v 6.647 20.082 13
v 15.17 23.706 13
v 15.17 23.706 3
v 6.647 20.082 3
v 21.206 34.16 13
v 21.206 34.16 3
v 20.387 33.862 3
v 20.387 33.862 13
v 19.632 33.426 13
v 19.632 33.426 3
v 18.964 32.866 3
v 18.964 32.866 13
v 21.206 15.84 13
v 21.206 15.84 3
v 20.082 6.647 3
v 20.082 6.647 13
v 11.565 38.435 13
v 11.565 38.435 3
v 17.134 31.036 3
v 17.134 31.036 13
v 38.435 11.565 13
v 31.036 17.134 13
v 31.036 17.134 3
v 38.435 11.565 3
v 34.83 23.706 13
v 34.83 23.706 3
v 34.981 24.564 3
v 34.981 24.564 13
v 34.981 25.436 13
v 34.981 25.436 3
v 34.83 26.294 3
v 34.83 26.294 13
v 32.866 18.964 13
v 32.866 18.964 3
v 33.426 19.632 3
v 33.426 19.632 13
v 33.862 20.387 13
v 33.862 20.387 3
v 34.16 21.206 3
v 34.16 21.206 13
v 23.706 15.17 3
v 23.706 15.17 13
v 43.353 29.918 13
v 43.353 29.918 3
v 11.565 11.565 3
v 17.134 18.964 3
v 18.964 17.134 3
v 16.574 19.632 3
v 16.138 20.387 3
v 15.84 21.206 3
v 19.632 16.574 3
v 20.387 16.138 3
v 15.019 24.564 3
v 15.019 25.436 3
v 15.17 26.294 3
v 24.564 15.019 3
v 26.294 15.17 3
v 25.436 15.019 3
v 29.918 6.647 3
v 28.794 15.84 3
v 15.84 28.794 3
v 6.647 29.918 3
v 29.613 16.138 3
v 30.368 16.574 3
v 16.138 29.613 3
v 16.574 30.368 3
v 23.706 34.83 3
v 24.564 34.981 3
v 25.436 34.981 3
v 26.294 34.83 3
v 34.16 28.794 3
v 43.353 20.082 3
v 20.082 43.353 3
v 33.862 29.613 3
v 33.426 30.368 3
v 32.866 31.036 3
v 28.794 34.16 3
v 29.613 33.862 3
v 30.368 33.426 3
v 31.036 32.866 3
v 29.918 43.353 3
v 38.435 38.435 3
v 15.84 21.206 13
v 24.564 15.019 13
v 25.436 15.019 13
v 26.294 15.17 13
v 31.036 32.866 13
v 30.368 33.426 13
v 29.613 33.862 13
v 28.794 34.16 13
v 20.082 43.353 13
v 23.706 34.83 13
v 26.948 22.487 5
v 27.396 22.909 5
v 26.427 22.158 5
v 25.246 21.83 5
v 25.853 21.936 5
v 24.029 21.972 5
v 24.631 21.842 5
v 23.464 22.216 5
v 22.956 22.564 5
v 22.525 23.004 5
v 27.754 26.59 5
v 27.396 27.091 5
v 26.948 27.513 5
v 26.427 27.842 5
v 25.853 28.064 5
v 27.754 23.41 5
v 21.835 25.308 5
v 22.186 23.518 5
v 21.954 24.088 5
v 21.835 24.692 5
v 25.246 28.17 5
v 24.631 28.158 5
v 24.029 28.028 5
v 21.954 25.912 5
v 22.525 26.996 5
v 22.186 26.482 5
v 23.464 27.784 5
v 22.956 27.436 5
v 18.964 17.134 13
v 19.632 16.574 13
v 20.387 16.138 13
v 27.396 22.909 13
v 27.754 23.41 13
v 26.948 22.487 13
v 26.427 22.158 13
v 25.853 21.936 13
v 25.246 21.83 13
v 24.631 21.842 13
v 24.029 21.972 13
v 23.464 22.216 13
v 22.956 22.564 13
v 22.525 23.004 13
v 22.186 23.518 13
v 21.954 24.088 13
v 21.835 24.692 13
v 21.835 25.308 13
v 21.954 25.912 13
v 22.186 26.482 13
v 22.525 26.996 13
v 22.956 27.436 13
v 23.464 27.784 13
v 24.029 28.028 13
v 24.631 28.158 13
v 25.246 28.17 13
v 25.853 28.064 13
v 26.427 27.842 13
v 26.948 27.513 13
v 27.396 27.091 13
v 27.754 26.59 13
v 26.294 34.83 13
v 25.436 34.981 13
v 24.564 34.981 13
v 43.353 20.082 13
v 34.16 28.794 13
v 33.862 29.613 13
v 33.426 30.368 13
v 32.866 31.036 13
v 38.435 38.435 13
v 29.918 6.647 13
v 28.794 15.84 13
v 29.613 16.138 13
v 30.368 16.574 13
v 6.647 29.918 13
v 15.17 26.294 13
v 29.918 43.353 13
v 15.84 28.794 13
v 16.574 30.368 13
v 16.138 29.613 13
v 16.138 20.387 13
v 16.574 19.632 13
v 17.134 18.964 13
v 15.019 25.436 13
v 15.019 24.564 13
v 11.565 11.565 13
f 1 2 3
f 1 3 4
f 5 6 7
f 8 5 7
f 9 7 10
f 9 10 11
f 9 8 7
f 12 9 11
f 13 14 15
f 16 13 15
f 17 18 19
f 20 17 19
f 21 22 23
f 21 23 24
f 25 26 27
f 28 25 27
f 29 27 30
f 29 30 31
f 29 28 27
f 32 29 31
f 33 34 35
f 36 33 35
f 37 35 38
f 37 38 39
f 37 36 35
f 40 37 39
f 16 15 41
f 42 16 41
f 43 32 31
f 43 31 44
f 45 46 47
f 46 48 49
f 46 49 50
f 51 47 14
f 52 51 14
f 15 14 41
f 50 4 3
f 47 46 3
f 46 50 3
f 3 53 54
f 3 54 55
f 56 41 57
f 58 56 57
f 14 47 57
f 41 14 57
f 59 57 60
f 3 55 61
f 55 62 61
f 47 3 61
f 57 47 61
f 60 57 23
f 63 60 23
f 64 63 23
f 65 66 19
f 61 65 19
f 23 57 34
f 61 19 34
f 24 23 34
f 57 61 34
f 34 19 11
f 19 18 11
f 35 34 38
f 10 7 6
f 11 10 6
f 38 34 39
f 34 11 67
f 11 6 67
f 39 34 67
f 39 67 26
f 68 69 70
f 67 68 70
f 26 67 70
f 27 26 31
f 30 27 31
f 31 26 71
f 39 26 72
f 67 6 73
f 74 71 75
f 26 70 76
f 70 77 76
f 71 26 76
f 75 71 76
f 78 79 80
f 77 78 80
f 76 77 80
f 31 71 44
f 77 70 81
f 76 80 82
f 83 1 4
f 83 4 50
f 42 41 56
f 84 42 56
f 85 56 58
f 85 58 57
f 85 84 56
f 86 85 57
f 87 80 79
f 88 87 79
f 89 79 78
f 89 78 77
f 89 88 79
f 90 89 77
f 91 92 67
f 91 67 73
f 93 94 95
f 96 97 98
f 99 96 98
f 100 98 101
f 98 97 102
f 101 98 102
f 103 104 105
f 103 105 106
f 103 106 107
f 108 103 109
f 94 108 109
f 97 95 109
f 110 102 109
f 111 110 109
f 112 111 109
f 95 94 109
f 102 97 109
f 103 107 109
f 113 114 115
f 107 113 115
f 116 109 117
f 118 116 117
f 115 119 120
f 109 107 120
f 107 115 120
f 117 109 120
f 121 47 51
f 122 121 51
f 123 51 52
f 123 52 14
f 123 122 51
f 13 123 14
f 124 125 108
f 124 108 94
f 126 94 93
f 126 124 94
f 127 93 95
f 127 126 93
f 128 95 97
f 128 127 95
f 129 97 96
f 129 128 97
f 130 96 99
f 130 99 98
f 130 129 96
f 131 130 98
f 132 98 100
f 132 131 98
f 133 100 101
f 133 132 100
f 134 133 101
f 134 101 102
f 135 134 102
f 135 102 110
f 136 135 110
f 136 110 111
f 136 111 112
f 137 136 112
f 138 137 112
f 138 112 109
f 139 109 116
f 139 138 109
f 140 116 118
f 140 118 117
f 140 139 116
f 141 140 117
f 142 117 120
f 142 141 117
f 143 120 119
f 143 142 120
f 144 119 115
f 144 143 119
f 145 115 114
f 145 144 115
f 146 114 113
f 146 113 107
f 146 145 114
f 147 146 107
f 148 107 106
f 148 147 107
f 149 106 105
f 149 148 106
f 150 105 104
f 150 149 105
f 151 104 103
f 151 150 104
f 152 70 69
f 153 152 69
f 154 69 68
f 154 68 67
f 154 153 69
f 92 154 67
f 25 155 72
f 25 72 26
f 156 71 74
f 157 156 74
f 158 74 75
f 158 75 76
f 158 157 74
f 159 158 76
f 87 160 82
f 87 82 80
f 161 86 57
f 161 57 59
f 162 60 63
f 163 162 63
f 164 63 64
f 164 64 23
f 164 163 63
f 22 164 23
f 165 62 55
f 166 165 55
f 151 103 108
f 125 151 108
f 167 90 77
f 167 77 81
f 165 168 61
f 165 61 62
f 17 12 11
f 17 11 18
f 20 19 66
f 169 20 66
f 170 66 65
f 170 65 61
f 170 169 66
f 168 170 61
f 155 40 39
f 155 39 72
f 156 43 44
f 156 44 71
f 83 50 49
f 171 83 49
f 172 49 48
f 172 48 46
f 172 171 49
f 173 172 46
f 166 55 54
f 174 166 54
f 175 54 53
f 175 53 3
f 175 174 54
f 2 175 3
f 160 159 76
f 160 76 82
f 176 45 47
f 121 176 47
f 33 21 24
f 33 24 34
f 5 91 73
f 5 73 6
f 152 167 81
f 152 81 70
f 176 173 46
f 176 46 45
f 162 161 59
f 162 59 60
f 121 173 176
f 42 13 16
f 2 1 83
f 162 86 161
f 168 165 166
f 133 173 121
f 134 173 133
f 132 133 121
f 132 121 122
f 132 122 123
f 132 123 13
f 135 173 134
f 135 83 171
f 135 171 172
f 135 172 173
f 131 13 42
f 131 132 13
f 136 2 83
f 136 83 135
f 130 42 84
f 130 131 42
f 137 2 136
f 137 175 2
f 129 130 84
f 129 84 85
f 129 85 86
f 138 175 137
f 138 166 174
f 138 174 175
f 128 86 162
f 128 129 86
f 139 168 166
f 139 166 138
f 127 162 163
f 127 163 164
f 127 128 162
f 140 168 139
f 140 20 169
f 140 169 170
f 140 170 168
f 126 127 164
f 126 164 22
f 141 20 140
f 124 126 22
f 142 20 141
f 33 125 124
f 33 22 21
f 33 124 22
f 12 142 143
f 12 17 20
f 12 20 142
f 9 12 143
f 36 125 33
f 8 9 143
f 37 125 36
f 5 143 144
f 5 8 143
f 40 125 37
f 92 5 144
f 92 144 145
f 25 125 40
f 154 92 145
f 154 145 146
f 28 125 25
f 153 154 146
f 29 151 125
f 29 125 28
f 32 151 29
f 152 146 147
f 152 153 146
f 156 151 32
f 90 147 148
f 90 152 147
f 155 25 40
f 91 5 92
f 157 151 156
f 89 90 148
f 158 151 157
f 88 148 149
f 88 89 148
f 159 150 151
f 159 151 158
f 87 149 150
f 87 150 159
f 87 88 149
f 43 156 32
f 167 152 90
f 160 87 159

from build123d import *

# Parameters (mm, degrees)
SKETCH2_R          = 19
BASECIRCLE_DEPTH   = 5
CUT_EXTRUDE2_DEPTH = 8
CUT_EXTRUDE1_DEPTH = 10
CIRPATTERN1_COUNT  = 12


with BuildPart() as part:
    # Sketch2 → BaseCircle (new, symmetric)
    with BuildSketch(Plane.XY.offset(8)):
        with Locations((25, 25)):
            Circle(SKETCH2_R)
    extrude(amount=BASECIRCLE_DEPTH, both=True)

    # Sketch4 → Cut-Extrude2 (cut)
    with BuildSketch(Plane.XY.offset(13)):
        with BuildLine():
            Line((27.753960784, 26.59), (27.753960784, 23.41))
            ThreePointArc((27.753960784, 23.41), (21.82, 25), (27.753960784, 26.59))
        make_face()
    extrude(amount=-CUT_EXTRUDE2_DEPTH, mode=Mode.SUBTRACT)

    # Sketch3 → Cut-Extrude1 (cut)
    with BuildSketch(Plane.XY.offset(13)):
        with BuildLine():
            Line((20.082438143, 6.647409301), (23.705904774, 15.170370869))
            ThreePointArc((23.705904774, 15.170370869), (25, 15), (26.294095226, 15.170370869))
            Line((26.294095226, 15.170370869), (29.917561857, 6.647409301))
            ThreePointArc((29.917561857, 6.647409301), (25, 6), (20.082438143, 6.647409301))
        make_face()
    cut_extrude1 = extrude(amount=-CUT_EXTRUDE1_DEPTH, mode=Mode.SUBTRACT)

    # CirPattern1: Cut-Extrude1 ×12 about axis
    cirpattern1_axis = Axis((25, 25, 0), (0, 0, 1))
    for i in range(1, CIRPATTERN1_COUNT):
        add(cut_extrude1.rotate(cirpattern1_axis, i * 360 / CIRPATTERN1_COUNT), mode=Mode.SUBTRACT)


solid = part.part
